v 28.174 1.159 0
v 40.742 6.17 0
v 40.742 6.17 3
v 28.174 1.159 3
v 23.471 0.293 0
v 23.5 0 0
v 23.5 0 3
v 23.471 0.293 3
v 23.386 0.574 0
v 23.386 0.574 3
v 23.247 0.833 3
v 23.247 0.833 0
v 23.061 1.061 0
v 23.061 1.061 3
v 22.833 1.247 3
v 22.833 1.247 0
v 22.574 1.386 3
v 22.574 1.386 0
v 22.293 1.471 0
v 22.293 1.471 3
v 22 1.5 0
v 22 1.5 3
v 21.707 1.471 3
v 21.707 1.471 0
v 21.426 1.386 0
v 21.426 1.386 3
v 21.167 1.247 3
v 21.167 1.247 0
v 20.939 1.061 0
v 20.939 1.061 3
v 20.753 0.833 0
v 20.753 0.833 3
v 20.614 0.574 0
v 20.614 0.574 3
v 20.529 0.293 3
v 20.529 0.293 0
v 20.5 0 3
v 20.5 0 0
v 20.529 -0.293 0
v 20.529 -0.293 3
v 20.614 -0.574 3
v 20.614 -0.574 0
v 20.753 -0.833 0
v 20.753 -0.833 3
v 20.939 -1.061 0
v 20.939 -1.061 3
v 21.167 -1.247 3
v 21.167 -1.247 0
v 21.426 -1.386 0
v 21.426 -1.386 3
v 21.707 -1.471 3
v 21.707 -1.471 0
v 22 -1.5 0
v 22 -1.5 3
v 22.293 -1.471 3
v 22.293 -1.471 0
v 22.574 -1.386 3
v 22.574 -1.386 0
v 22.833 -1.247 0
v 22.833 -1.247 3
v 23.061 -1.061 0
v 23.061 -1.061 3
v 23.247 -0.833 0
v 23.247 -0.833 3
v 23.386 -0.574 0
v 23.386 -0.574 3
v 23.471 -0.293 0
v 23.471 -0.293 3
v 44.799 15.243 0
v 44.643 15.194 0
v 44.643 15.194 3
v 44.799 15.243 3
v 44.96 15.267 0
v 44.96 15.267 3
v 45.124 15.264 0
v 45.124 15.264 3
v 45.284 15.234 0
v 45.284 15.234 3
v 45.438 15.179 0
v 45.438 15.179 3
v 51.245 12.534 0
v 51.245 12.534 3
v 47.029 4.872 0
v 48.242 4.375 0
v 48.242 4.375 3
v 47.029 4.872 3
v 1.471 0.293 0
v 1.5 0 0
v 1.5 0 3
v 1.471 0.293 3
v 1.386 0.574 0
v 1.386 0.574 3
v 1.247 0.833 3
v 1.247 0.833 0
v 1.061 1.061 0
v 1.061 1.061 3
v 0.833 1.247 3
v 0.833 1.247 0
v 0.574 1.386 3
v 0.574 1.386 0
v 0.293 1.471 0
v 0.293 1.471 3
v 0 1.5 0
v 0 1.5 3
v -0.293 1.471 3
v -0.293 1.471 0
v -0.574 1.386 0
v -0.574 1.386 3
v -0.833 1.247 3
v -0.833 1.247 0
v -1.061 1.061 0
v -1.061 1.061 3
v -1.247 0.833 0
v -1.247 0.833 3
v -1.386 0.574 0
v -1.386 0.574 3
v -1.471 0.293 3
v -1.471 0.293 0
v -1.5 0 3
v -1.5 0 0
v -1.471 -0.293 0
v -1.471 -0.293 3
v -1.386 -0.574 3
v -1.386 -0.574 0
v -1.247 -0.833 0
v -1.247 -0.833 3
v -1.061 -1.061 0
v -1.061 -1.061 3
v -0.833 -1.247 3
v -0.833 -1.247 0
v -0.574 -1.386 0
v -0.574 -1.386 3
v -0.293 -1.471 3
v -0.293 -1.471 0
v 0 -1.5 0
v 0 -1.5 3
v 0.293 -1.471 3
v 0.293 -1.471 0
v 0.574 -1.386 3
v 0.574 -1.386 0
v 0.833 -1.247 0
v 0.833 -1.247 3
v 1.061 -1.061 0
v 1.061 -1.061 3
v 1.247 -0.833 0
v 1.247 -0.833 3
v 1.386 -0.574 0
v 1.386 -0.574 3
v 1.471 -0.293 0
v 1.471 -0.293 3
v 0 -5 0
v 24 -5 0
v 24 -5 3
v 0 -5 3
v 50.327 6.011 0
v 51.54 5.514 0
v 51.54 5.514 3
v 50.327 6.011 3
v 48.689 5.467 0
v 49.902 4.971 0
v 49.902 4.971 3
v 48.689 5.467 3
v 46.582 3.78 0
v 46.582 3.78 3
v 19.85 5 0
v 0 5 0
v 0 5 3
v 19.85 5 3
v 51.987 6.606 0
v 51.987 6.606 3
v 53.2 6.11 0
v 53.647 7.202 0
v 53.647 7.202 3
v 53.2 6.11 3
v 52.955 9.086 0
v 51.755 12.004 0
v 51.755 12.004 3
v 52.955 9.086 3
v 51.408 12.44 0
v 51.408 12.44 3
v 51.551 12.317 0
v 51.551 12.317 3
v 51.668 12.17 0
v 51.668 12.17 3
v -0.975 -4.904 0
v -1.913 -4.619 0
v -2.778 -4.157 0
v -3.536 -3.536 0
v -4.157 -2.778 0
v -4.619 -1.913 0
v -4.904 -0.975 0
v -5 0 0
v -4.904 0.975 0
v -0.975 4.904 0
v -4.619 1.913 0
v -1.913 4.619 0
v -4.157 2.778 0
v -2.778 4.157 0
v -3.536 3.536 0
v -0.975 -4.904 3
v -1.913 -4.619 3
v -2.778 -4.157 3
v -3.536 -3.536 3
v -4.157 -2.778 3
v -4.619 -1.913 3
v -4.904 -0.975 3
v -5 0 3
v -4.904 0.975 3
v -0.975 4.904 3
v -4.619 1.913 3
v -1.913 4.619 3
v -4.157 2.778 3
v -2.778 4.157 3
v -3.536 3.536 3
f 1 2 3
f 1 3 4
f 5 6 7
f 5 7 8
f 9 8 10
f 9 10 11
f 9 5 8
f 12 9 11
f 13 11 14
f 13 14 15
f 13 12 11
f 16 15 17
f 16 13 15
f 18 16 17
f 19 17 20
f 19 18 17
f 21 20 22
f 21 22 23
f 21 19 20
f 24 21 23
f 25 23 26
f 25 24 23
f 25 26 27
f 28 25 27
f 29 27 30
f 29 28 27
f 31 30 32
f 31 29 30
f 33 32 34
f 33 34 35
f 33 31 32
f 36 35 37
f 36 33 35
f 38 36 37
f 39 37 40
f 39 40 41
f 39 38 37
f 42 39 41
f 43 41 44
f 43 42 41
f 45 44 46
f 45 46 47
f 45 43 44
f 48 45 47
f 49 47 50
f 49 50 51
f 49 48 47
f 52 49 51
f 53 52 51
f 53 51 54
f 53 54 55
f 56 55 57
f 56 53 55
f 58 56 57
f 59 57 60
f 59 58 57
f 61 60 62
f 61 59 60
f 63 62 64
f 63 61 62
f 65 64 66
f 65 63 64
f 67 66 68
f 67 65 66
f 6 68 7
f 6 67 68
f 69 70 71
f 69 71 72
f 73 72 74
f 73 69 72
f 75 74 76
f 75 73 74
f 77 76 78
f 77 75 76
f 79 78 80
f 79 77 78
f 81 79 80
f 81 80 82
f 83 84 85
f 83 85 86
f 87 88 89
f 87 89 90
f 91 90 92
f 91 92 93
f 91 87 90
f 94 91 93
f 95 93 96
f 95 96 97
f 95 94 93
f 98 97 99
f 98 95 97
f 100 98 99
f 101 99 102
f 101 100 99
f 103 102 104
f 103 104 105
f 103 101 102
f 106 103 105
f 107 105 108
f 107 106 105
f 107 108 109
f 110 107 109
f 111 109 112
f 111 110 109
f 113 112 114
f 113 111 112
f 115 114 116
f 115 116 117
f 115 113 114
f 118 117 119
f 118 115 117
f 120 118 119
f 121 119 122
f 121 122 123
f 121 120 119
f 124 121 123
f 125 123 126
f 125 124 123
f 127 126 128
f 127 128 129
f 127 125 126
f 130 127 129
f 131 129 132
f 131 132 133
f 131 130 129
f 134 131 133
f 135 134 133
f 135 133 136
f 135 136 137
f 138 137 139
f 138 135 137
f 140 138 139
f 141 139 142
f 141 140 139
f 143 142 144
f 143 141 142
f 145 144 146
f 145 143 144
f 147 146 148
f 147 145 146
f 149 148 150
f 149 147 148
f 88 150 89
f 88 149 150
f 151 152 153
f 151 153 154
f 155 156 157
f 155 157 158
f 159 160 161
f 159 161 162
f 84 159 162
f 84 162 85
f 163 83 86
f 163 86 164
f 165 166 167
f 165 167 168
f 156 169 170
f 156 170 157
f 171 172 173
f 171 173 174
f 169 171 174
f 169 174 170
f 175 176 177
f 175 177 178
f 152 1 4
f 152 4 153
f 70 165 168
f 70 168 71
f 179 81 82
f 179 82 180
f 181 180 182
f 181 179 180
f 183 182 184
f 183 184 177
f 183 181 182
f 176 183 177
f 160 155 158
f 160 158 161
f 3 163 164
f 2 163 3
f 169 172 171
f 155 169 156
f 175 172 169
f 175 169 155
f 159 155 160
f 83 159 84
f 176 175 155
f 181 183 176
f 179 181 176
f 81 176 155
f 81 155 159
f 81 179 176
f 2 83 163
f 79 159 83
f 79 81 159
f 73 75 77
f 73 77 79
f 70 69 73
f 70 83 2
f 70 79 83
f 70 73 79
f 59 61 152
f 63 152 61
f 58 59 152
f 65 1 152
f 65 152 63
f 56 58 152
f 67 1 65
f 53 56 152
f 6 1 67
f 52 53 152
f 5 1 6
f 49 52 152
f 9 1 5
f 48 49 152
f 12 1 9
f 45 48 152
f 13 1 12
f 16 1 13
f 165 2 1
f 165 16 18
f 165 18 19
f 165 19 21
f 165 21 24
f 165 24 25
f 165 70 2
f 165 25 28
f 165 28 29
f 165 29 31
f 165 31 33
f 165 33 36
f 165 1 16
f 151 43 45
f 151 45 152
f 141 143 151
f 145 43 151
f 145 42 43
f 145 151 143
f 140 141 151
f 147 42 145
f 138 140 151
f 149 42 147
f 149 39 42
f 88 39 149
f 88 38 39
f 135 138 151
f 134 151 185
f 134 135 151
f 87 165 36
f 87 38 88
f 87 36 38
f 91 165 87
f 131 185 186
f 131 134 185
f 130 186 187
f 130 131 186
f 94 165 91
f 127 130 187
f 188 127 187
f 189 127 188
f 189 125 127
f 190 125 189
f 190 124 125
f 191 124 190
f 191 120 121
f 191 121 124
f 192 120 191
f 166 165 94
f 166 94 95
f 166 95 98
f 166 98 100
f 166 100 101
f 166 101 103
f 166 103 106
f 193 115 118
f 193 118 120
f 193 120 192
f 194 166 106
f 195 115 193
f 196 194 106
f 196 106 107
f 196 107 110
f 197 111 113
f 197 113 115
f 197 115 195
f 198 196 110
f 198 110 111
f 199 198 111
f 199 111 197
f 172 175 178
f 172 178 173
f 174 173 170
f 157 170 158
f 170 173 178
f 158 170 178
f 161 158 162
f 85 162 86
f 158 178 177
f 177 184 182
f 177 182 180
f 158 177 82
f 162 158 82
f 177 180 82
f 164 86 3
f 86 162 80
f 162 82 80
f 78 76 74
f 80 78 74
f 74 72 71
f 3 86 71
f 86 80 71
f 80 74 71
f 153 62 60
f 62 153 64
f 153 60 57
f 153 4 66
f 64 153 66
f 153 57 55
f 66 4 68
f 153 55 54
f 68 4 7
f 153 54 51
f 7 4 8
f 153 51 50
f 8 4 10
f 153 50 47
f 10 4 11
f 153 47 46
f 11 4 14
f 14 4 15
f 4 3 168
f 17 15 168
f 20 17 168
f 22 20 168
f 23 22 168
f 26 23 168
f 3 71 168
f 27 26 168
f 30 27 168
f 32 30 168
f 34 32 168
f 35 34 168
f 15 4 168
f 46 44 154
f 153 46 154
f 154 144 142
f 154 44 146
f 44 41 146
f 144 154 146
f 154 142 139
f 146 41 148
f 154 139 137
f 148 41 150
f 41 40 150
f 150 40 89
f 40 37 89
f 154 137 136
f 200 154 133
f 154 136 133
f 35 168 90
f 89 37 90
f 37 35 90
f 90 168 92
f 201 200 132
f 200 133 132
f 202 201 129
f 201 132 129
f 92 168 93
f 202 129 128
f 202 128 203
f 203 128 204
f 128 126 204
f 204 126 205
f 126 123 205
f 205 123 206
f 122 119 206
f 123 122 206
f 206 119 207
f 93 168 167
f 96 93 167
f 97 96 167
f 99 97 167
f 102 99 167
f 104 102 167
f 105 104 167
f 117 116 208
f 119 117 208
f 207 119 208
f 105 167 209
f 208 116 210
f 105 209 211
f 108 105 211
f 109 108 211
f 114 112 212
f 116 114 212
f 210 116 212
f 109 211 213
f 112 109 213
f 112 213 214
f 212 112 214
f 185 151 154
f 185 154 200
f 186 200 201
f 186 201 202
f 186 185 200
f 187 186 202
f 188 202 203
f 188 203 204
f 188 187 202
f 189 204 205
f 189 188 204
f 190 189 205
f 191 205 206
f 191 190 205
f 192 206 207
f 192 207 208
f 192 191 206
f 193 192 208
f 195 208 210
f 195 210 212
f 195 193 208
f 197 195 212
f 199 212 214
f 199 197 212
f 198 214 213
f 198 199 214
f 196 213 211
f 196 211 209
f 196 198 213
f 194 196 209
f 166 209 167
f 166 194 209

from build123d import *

# Parameters (mm, degrees)
SKETCH1_R           = 1.5
BOSS_EXTRUDE1_DEPTH = 3


with BuildPart() as part:
    # Sketch1 → Boss-Extrude1 (new body)
    with BuildSketch(Plane.XY):
        with BuildLine():
            Line((0, 5), (19.85, 5))
            Line((19.85, 5), (44.643069029, 15.193663072))
            ThreePointArc((44.643069029, 15.193663072), (45.042006379, 15.268610471), (45.43786686, 15.178818479))
            Line((45.43786686, 15.178818479), (51.245085043, 12.533540635))
            ThreePointArc((51.245085043, 12.533540635), (51.550738574, 12.317286013), (51.755428853, 12.003770413))
            Line((51.755428853, 12.003770413), (52.954960556, 9.086264498))
            Line((52.954960556, 9.086264498), (53.647413738, 7.201821951))
            Line((53.647413738, 7.201821951), (53.200417763, 6.109762155))
            Line((53.200417763, 6.109762155), (51.987413738, 6.606262365))
            Line((51.987413738, 6.606262365), (51.540417763, 5.514202569))
            Line((51.540417763, 5.514202569), (50.327413738, 6.010702778))
            Line((50.327413738, 6.010702778), (49.901790908, 4.970859901))
            Line((49.901790908, 4.970859901), (48.688786884, 5.467360111))
            Line((48.688786884, 5.467360111), (48.241790908, 4.375300315))
            Line((48.241790908, 4.375300315), (47.028786884, 4.871800524))
            Line((47.028786884, 4.871800524), (46.581790908, 3.779740729))
            Line((46.581790908, 3.779740729), (40.742047423, 6.170032768))
            Line((40.742047423, 6.170032768), (28.174379319, 1.158584034))
            Line((28.174379319, 1.158584034), (24, -5))
            Line((24, -5), (22, -5))
            Line((22, -5), (0, -5))
            ThreePointArc((0, -5), (-5, 0), (0, 5))
        make_face()
        Circle(SKETCH1_R, mode=Mode.SUBTRACT)
        with Locations((22, 0)):
            Circle(SKETCH1_R, mode=Mode.SUBTRACT)
    extrude(amount=BOSS_EXTRUDE1_DEPTH)


solid = part.part
